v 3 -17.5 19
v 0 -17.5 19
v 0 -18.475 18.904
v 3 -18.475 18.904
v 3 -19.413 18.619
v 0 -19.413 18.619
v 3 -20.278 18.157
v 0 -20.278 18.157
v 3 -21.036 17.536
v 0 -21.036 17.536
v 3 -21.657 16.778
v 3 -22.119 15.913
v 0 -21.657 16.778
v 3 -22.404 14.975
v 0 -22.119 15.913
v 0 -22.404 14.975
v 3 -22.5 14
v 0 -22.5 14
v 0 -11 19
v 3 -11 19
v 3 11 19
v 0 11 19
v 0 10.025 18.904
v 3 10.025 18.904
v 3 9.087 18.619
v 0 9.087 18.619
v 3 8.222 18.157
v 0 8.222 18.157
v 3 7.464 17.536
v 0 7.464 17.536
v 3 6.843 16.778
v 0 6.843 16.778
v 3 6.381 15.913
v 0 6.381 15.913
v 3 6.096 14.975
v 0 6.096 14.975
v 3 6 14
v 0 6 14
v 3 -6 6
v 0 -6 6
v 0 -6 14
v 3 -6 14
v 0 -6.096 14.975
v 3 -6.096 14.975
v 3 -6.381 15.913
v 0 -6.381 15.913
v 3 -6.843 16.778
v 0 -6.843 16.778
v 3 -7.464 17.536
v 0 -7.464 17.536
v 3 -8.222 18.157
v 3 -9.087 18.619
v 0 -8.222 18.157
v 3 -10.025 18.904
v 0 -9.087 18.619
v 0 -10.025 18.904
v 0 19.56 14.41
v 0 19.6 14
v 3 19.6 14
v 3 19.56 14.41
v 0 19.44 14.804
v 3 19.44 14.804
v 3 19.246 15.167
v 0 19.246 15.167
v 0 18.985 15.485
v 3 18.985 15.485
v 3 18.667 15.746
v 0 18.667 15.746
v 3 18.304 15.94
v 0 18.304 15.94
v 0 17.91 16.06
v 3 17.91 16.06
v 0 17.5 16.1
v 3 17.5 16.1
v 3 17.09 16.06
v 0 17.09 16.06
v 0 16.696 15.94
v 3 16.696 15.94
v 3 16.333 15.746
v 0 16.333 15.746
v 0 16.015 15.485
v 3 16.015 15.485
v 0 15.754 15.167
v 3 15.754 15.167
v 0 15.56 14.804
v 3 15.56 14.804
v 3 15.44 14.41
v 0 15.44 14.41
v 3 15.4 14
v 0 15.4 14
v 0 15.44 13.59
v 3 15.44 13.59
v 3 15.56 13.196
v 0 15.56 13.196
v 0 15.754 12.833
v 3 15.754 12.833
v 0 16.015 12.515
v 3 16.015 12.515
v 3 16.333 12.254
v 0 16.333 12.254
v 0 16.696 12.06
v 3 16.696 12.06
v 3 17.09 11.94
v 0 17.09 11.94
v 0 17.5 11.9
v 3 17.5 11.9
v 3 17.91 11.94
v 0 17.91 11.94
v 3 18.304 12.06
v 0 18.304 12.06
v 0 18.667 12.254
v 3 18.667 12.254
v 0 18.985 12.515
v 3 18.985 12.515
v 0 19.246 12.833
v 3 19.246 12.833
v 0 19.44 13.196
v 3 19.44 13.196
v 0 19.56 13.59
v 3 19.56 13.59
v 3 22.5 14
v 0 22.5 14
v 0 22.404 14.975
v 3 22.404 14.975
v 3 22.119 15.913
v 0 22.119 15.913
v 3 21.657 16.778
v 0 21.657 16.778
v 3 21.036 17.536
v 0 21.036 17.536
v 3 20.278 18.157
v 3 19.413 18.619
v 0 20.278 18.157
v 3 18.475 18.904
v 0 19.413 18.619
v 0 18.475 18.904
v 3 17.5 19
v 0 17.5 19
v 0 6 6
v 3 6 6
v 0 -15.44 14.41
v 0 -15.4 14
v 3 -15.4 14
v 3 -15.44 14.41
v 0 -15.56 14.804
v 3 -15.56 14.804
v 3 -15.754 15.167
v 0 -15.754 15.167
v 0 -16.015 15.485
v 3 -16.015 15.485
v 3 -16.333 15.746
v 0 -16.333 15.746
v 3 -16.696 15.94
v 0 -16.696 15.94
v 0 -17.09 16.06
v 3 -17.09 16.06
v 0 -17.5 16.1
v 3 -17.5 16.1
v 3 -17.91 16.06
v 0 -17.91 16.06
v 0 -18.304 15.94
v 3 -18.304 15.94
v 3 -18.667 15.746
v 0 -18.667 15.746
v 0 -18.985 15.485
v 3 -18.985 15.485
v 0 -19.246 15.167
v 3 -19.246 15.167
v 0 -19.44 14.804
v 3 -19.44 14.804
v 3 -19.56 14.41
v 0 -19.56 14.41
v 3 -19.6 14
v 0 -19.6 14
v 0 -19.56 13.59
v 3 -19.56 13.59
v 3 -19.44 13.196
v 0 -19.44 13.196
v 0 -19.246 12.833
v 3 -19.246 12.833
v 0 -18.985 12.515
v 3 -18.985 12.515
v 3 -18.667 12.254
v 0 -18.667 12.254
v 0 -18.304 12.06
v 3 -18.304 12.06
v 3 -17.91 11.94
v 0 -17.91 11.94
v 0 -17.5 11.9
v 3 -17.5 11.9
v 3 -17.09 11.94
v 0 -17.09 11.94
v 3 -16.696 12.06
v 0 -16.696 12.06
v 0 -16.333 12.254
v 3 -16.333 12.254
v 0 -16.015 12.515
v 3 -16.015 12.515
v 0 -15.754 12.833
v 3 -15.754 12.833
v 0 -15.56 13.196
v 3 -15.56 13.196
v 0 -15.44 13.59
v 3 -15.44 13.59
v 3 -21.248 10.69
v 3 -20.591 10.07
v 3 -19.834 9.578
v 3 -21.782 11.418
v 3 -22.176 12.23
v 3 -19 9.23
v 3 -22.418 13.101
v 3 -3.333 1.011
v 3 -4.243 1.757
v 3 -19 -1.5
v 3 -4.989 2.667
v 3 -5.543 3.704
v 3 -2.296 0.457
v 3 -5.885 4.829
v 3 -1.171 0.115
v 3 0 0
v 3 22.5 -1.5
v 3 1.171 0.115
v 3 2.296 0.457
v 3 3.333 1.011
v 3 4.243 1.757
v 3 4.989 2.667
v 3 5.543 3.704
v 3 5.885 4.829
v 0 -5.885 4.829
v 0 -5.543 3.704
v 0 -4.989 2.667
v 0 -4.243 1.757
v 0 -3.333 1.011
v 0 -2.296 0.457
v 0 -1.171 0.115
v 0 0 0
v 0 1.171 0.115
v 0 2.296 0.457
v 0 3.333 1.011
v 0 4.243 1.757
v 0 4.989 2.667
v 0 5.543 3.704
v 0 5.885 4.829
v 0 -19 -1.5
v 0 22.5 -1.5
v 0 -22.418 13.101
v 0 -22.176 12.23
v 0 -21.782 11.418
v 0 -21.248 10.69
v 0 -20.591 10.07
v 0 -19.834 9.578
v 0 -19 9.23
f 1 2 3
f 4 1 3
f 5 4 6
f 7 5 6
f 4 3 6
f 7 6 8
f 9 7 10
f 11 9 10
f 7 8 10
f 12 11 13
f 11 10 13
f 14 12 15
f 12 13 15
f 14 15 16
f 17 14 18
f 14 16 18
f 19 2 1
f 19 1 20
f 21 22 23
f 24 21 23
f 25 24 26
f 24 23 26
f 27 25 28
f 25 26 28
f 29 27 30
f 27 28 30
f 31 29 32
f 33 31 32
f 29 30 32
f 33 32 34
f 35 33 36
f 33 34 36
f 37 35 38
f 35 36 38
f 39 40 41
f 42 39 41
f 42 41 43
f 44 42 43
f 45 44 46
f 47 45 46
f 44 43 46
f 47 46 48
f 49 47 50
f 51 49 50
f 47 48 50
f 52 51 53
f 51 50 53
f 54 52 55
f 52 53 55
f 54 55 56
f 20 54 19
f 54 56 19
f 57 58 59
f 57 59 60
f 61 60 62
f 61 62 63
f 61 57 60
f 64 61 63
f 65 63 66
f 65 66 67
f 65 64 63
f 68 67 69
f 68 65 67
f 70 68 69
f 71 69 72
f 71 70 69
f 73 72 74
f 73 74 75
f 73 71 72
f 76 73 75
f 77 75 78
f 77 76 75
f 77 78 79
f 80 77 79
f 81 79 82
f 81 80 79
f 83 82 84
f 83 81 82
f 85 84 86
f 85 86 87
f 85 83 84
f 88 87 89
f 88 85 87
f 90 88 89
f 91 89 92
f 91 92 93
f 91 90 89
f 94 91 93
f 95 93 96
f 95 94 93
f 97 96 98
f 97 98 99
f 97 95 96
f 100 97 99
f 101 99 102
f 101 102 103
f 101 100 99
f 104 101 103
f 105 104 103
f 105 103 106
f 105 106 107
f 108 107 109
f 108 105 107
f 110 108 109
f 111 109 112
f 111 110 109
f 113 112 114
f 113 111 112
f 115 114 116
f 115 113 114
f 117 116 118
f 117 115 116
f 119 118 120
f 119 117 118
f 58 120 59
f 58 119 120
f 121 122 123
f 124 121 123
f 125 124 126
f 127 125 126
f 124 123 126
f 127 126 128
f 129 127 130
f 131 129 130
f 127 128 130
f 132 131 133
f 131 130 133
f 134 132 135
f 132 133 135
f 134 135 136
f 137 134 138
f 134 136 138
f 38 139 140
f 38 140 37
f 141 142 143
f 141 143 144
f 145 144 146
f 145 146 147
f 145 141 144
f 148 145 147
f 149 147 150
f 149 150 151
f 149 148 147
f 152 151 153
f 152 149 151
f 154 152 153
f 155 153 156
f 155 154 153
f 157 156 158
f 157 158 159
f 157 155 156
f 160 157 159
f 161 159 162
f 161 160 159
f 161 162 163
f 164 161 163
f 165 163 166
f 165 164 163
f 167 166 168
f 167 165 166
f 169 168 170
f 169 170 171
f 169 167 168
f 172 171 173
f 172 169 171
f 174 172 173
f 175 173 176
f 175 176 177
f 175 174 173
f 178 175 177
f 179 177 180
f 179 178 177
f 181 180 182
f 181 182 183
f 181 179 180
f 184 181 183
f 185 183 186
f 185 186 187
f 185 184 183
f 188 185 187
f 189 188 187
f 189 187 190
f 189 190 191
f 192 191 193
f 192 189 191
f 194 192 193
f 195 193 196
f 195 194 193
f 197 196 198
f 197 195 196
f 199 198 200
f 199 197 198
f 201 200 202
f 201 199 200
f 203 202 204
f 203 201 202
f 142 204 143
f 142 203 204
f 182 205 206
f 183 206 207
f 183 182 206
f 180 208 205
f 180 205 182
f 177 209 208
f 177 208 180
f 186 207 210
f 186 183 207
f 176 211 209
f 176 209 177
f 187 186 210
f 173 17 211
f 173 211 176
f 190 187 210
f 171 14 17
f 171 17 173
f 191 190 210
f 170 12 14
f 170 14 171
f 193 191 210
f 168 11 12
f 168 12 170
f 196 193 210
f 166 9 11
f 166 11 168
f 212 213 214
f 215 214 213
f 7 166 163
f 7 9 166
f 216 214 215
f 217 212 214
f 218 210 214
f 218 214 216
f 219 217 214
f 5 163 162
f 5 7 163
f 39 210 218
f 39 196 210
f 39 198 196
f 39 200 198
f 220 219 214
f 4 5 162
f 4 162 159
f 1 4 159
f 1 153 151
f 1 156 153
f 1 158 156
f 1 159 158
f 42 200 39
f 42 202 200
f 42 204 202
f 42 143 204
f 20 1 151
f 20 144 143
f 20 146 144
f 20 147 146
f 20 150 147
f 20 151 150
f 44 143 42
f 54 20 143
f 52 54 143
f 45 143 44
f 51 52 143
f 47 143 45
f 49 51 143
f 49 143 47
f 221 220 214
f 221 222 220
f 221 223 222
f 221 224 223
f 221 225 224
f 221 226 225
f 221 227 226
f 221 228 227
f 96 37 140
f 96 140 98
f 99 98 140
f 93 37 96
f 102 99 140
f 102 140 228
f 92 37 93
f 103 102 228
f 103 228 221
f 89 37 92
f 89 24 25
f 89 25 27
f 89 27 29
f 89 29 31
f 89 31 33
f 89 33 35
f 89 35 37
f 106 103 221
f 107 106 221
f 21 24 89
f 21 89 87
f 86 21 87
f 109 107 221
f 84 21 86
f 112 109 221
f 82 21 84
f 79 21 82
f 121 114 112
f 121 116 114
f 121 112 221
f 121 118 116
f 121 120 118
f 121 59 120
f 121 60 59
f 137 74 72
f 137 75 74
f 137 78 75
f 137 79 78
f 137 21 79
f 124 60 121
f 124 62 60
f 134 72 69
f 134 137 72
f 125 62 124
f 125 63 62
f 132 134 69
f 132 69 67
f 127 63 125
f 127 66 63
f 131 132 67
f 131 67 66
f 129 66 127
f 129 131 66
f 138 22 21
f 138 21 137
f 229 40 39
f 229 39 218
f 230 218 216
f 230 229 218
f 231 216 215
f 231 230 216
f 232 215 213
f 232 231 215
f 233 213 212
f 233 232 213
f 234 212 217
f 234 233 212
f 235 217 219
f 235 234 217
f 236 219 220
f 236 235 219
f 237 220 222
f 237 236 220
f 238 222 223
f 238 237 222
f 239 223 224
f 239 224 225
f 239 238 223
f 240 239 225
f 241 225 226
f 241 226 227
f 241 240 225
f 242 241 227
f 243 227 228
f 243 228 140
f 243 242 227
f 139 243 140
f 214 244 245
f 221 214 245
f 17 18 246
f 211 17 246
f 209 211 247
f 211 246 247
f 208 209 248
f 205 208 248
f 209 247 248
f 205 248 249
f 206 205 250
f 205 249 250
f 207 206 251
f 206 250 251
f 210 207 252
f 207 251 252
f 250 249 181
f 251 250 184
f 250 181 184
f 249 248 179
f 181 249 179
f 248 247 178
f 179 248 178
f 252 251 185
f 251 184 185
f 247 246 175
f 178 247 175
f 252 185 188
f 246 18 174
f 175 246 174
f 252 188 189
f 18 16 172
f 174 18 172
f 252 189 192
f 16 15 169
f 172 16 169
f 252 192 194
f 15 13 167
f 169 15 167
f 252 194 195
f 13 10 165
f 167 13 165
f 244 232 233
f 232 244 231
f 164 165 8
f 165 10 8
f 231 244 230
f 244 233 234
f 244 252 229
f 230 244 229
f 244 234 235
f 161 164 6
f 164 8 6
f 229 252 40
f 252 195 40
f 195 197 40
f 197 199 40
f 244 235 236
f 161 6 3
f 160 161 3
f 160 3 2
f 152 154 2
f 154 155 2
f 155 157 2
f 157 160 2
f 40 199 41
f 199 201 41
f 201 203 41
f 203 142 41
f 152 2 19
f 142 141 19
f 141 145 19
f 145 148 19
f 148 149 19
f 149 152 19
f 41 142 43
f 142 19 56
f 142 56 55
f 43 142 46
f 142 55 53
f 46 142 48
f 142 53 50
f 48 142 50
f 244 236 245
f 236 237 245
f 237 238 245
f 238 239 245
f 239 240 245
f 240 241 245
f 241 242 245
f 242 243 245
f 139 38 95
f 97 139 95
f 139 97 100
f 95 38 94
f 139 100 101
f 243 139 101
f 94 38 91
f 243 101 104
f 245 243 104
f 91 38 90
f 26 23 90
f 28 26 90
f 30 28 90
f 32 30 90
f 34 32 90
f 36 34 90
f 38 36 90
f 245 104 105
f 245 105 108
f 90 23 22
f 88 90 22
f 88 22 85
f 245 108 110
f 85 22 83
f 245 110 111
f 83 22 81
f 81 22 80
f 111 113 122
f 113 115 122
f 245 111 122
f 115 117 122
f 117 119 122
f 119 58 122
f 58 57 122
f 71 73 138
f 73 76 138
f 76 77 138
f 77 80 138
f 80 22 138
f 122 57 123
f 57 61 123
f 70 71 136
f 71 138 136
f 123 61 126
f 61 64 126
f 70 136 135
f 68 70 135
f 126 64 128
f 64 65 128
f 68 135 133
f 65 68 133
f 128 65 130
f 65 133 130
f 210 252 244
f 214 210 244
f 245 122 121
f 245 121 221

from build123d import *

# Parameters (mm, degrees)
SKETCH_R  = 2.1
PAD_DEPTH = 3


with BuildPart() as part:
    # Sketch → Pad (new body)
    with BuildSketch(Plane.YZ):
        with BuildLine():
            ThreePointArc((-17.5, 19), (-21.035534, 17.535534), (-22.5, 14))
            ThreePointArc((-22.5, 14), (-21.531129, 11.04196), (-19, 9.230304))
            Line((-19, 9.230304), (-19, -1.5))
            Line((-19, -1.5), (22.5, -1.5))
            Line((22.5, 14), (22.5, -1.5))
            ThreePointArc((22.5, 14), (21.035534, 17.535534), (17.5, 19))
            Line((11, 19), (17.5, 19))
            ThreePointArc((11, 19), (7.464466, 17.535534), (6, 14))
            Line((6, 6), (6, 14))
            ThreePointArc((-6, 6), (0, 0), (6, 6))
            Line((-6, 6), (-6, 14))
            ThreePointArc((-6, 14), (-7.464466, 17.535534), (-11, 19))
            Line((-17.5, 19), (-11, 19))
        make_face()
        with Locations((-17.5, 14)):
            Circle(SKETCH_R, mode=Mode.SUBTRACT)
        with Locations((17.5, 14)):
            Circle(SKETCH_R, mode=Mode.SUBTRACT)
    extrude(amount=PAD_DEPTH)


solid = part.part
